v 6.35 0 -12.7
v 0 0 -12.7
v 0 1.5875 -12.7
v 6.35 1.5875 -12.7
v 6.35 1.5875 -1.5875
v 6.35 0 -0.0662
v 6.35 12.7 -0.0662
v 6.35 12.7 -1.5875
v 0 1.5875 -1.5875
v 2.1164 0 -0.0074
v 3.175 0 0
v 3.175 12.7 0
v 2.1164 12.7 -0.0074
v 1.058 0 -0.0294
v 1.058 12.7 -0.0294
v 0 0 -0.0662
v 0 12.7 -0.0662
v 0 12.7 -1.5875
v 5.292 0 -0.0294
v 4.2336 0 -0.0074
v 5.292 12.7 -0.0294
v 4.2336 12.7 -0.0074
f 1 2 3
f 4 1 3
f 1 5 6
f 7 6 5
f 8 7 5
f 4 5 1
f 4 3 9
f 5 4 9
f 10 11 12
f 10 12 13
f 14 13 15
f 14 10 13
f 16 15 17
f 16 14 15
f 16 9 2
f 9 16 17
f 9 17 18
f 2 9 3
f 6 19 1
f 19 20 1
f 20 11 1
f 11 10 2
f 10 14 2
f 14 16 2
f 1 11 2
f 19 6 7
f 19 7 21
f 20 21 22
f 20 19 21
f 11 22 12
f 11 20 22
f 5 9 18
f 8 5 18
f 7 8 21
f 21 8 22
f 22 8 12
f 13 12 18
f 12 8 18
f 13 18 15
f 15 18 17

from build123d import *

# Parameters (mm, degrees)
BOSS_EXTRUDE1_DEPTH = 6.35
CUT_EXTRUDE1_START  = -12.7
CUT_EXTRUDE1_DEPTH  = 12.7


# Read off the part's stored shape, not the designer's step: Cut-Extrude1
with BuildPart() as part:
    # Sketch1 → Boss-Extrude1 (new body)
    with BuildSketch(Plane(origin=(0, 0, 0), x_dir=(0, 0, -1), z_dir=(1, 0, 0))):
        Polygon((0, 0), (12.7, 0), (12.7, 1.5875), (1.5875, 1.5875), (1.5875, 12.7), (0, 12.7), align=None)
    extrude(amount=BOSS_EXTRUDE1_DEPTH)

    # Cut-Extrude1 outline → Cut-Extrude1 (cut)
    with BuildSketch(Plane(origin=(0, 12.7, 0), x_dir=(1, 0, 0), z_dir=(0, 1, 0)).offset(CUT_EXTRUDE1_START)):
        with BuildLine():
            ThreePointArc((6.35, 0.066174567), (4.762844565, 0.016545434), (3.174999586, 0))
            Line((3.174999586, 0), (6.35, 0))
            Line((6.35, 0), (6.35, 0.066174567))
        make_face()
        with BuildLine():
            ThreePointArc((3.174999586, 0), (1.587155022, 0.016545442), (0, 0.066174567))
            Line((0, 0.066174567), (0, 0))
            Line((0, 0), (3.174999586, 0))
        make_face()
    extrude(amount=CUT_EXTRUDE1_DEPTH, mode=Mode.SUBTRACT)


solid = part.part
